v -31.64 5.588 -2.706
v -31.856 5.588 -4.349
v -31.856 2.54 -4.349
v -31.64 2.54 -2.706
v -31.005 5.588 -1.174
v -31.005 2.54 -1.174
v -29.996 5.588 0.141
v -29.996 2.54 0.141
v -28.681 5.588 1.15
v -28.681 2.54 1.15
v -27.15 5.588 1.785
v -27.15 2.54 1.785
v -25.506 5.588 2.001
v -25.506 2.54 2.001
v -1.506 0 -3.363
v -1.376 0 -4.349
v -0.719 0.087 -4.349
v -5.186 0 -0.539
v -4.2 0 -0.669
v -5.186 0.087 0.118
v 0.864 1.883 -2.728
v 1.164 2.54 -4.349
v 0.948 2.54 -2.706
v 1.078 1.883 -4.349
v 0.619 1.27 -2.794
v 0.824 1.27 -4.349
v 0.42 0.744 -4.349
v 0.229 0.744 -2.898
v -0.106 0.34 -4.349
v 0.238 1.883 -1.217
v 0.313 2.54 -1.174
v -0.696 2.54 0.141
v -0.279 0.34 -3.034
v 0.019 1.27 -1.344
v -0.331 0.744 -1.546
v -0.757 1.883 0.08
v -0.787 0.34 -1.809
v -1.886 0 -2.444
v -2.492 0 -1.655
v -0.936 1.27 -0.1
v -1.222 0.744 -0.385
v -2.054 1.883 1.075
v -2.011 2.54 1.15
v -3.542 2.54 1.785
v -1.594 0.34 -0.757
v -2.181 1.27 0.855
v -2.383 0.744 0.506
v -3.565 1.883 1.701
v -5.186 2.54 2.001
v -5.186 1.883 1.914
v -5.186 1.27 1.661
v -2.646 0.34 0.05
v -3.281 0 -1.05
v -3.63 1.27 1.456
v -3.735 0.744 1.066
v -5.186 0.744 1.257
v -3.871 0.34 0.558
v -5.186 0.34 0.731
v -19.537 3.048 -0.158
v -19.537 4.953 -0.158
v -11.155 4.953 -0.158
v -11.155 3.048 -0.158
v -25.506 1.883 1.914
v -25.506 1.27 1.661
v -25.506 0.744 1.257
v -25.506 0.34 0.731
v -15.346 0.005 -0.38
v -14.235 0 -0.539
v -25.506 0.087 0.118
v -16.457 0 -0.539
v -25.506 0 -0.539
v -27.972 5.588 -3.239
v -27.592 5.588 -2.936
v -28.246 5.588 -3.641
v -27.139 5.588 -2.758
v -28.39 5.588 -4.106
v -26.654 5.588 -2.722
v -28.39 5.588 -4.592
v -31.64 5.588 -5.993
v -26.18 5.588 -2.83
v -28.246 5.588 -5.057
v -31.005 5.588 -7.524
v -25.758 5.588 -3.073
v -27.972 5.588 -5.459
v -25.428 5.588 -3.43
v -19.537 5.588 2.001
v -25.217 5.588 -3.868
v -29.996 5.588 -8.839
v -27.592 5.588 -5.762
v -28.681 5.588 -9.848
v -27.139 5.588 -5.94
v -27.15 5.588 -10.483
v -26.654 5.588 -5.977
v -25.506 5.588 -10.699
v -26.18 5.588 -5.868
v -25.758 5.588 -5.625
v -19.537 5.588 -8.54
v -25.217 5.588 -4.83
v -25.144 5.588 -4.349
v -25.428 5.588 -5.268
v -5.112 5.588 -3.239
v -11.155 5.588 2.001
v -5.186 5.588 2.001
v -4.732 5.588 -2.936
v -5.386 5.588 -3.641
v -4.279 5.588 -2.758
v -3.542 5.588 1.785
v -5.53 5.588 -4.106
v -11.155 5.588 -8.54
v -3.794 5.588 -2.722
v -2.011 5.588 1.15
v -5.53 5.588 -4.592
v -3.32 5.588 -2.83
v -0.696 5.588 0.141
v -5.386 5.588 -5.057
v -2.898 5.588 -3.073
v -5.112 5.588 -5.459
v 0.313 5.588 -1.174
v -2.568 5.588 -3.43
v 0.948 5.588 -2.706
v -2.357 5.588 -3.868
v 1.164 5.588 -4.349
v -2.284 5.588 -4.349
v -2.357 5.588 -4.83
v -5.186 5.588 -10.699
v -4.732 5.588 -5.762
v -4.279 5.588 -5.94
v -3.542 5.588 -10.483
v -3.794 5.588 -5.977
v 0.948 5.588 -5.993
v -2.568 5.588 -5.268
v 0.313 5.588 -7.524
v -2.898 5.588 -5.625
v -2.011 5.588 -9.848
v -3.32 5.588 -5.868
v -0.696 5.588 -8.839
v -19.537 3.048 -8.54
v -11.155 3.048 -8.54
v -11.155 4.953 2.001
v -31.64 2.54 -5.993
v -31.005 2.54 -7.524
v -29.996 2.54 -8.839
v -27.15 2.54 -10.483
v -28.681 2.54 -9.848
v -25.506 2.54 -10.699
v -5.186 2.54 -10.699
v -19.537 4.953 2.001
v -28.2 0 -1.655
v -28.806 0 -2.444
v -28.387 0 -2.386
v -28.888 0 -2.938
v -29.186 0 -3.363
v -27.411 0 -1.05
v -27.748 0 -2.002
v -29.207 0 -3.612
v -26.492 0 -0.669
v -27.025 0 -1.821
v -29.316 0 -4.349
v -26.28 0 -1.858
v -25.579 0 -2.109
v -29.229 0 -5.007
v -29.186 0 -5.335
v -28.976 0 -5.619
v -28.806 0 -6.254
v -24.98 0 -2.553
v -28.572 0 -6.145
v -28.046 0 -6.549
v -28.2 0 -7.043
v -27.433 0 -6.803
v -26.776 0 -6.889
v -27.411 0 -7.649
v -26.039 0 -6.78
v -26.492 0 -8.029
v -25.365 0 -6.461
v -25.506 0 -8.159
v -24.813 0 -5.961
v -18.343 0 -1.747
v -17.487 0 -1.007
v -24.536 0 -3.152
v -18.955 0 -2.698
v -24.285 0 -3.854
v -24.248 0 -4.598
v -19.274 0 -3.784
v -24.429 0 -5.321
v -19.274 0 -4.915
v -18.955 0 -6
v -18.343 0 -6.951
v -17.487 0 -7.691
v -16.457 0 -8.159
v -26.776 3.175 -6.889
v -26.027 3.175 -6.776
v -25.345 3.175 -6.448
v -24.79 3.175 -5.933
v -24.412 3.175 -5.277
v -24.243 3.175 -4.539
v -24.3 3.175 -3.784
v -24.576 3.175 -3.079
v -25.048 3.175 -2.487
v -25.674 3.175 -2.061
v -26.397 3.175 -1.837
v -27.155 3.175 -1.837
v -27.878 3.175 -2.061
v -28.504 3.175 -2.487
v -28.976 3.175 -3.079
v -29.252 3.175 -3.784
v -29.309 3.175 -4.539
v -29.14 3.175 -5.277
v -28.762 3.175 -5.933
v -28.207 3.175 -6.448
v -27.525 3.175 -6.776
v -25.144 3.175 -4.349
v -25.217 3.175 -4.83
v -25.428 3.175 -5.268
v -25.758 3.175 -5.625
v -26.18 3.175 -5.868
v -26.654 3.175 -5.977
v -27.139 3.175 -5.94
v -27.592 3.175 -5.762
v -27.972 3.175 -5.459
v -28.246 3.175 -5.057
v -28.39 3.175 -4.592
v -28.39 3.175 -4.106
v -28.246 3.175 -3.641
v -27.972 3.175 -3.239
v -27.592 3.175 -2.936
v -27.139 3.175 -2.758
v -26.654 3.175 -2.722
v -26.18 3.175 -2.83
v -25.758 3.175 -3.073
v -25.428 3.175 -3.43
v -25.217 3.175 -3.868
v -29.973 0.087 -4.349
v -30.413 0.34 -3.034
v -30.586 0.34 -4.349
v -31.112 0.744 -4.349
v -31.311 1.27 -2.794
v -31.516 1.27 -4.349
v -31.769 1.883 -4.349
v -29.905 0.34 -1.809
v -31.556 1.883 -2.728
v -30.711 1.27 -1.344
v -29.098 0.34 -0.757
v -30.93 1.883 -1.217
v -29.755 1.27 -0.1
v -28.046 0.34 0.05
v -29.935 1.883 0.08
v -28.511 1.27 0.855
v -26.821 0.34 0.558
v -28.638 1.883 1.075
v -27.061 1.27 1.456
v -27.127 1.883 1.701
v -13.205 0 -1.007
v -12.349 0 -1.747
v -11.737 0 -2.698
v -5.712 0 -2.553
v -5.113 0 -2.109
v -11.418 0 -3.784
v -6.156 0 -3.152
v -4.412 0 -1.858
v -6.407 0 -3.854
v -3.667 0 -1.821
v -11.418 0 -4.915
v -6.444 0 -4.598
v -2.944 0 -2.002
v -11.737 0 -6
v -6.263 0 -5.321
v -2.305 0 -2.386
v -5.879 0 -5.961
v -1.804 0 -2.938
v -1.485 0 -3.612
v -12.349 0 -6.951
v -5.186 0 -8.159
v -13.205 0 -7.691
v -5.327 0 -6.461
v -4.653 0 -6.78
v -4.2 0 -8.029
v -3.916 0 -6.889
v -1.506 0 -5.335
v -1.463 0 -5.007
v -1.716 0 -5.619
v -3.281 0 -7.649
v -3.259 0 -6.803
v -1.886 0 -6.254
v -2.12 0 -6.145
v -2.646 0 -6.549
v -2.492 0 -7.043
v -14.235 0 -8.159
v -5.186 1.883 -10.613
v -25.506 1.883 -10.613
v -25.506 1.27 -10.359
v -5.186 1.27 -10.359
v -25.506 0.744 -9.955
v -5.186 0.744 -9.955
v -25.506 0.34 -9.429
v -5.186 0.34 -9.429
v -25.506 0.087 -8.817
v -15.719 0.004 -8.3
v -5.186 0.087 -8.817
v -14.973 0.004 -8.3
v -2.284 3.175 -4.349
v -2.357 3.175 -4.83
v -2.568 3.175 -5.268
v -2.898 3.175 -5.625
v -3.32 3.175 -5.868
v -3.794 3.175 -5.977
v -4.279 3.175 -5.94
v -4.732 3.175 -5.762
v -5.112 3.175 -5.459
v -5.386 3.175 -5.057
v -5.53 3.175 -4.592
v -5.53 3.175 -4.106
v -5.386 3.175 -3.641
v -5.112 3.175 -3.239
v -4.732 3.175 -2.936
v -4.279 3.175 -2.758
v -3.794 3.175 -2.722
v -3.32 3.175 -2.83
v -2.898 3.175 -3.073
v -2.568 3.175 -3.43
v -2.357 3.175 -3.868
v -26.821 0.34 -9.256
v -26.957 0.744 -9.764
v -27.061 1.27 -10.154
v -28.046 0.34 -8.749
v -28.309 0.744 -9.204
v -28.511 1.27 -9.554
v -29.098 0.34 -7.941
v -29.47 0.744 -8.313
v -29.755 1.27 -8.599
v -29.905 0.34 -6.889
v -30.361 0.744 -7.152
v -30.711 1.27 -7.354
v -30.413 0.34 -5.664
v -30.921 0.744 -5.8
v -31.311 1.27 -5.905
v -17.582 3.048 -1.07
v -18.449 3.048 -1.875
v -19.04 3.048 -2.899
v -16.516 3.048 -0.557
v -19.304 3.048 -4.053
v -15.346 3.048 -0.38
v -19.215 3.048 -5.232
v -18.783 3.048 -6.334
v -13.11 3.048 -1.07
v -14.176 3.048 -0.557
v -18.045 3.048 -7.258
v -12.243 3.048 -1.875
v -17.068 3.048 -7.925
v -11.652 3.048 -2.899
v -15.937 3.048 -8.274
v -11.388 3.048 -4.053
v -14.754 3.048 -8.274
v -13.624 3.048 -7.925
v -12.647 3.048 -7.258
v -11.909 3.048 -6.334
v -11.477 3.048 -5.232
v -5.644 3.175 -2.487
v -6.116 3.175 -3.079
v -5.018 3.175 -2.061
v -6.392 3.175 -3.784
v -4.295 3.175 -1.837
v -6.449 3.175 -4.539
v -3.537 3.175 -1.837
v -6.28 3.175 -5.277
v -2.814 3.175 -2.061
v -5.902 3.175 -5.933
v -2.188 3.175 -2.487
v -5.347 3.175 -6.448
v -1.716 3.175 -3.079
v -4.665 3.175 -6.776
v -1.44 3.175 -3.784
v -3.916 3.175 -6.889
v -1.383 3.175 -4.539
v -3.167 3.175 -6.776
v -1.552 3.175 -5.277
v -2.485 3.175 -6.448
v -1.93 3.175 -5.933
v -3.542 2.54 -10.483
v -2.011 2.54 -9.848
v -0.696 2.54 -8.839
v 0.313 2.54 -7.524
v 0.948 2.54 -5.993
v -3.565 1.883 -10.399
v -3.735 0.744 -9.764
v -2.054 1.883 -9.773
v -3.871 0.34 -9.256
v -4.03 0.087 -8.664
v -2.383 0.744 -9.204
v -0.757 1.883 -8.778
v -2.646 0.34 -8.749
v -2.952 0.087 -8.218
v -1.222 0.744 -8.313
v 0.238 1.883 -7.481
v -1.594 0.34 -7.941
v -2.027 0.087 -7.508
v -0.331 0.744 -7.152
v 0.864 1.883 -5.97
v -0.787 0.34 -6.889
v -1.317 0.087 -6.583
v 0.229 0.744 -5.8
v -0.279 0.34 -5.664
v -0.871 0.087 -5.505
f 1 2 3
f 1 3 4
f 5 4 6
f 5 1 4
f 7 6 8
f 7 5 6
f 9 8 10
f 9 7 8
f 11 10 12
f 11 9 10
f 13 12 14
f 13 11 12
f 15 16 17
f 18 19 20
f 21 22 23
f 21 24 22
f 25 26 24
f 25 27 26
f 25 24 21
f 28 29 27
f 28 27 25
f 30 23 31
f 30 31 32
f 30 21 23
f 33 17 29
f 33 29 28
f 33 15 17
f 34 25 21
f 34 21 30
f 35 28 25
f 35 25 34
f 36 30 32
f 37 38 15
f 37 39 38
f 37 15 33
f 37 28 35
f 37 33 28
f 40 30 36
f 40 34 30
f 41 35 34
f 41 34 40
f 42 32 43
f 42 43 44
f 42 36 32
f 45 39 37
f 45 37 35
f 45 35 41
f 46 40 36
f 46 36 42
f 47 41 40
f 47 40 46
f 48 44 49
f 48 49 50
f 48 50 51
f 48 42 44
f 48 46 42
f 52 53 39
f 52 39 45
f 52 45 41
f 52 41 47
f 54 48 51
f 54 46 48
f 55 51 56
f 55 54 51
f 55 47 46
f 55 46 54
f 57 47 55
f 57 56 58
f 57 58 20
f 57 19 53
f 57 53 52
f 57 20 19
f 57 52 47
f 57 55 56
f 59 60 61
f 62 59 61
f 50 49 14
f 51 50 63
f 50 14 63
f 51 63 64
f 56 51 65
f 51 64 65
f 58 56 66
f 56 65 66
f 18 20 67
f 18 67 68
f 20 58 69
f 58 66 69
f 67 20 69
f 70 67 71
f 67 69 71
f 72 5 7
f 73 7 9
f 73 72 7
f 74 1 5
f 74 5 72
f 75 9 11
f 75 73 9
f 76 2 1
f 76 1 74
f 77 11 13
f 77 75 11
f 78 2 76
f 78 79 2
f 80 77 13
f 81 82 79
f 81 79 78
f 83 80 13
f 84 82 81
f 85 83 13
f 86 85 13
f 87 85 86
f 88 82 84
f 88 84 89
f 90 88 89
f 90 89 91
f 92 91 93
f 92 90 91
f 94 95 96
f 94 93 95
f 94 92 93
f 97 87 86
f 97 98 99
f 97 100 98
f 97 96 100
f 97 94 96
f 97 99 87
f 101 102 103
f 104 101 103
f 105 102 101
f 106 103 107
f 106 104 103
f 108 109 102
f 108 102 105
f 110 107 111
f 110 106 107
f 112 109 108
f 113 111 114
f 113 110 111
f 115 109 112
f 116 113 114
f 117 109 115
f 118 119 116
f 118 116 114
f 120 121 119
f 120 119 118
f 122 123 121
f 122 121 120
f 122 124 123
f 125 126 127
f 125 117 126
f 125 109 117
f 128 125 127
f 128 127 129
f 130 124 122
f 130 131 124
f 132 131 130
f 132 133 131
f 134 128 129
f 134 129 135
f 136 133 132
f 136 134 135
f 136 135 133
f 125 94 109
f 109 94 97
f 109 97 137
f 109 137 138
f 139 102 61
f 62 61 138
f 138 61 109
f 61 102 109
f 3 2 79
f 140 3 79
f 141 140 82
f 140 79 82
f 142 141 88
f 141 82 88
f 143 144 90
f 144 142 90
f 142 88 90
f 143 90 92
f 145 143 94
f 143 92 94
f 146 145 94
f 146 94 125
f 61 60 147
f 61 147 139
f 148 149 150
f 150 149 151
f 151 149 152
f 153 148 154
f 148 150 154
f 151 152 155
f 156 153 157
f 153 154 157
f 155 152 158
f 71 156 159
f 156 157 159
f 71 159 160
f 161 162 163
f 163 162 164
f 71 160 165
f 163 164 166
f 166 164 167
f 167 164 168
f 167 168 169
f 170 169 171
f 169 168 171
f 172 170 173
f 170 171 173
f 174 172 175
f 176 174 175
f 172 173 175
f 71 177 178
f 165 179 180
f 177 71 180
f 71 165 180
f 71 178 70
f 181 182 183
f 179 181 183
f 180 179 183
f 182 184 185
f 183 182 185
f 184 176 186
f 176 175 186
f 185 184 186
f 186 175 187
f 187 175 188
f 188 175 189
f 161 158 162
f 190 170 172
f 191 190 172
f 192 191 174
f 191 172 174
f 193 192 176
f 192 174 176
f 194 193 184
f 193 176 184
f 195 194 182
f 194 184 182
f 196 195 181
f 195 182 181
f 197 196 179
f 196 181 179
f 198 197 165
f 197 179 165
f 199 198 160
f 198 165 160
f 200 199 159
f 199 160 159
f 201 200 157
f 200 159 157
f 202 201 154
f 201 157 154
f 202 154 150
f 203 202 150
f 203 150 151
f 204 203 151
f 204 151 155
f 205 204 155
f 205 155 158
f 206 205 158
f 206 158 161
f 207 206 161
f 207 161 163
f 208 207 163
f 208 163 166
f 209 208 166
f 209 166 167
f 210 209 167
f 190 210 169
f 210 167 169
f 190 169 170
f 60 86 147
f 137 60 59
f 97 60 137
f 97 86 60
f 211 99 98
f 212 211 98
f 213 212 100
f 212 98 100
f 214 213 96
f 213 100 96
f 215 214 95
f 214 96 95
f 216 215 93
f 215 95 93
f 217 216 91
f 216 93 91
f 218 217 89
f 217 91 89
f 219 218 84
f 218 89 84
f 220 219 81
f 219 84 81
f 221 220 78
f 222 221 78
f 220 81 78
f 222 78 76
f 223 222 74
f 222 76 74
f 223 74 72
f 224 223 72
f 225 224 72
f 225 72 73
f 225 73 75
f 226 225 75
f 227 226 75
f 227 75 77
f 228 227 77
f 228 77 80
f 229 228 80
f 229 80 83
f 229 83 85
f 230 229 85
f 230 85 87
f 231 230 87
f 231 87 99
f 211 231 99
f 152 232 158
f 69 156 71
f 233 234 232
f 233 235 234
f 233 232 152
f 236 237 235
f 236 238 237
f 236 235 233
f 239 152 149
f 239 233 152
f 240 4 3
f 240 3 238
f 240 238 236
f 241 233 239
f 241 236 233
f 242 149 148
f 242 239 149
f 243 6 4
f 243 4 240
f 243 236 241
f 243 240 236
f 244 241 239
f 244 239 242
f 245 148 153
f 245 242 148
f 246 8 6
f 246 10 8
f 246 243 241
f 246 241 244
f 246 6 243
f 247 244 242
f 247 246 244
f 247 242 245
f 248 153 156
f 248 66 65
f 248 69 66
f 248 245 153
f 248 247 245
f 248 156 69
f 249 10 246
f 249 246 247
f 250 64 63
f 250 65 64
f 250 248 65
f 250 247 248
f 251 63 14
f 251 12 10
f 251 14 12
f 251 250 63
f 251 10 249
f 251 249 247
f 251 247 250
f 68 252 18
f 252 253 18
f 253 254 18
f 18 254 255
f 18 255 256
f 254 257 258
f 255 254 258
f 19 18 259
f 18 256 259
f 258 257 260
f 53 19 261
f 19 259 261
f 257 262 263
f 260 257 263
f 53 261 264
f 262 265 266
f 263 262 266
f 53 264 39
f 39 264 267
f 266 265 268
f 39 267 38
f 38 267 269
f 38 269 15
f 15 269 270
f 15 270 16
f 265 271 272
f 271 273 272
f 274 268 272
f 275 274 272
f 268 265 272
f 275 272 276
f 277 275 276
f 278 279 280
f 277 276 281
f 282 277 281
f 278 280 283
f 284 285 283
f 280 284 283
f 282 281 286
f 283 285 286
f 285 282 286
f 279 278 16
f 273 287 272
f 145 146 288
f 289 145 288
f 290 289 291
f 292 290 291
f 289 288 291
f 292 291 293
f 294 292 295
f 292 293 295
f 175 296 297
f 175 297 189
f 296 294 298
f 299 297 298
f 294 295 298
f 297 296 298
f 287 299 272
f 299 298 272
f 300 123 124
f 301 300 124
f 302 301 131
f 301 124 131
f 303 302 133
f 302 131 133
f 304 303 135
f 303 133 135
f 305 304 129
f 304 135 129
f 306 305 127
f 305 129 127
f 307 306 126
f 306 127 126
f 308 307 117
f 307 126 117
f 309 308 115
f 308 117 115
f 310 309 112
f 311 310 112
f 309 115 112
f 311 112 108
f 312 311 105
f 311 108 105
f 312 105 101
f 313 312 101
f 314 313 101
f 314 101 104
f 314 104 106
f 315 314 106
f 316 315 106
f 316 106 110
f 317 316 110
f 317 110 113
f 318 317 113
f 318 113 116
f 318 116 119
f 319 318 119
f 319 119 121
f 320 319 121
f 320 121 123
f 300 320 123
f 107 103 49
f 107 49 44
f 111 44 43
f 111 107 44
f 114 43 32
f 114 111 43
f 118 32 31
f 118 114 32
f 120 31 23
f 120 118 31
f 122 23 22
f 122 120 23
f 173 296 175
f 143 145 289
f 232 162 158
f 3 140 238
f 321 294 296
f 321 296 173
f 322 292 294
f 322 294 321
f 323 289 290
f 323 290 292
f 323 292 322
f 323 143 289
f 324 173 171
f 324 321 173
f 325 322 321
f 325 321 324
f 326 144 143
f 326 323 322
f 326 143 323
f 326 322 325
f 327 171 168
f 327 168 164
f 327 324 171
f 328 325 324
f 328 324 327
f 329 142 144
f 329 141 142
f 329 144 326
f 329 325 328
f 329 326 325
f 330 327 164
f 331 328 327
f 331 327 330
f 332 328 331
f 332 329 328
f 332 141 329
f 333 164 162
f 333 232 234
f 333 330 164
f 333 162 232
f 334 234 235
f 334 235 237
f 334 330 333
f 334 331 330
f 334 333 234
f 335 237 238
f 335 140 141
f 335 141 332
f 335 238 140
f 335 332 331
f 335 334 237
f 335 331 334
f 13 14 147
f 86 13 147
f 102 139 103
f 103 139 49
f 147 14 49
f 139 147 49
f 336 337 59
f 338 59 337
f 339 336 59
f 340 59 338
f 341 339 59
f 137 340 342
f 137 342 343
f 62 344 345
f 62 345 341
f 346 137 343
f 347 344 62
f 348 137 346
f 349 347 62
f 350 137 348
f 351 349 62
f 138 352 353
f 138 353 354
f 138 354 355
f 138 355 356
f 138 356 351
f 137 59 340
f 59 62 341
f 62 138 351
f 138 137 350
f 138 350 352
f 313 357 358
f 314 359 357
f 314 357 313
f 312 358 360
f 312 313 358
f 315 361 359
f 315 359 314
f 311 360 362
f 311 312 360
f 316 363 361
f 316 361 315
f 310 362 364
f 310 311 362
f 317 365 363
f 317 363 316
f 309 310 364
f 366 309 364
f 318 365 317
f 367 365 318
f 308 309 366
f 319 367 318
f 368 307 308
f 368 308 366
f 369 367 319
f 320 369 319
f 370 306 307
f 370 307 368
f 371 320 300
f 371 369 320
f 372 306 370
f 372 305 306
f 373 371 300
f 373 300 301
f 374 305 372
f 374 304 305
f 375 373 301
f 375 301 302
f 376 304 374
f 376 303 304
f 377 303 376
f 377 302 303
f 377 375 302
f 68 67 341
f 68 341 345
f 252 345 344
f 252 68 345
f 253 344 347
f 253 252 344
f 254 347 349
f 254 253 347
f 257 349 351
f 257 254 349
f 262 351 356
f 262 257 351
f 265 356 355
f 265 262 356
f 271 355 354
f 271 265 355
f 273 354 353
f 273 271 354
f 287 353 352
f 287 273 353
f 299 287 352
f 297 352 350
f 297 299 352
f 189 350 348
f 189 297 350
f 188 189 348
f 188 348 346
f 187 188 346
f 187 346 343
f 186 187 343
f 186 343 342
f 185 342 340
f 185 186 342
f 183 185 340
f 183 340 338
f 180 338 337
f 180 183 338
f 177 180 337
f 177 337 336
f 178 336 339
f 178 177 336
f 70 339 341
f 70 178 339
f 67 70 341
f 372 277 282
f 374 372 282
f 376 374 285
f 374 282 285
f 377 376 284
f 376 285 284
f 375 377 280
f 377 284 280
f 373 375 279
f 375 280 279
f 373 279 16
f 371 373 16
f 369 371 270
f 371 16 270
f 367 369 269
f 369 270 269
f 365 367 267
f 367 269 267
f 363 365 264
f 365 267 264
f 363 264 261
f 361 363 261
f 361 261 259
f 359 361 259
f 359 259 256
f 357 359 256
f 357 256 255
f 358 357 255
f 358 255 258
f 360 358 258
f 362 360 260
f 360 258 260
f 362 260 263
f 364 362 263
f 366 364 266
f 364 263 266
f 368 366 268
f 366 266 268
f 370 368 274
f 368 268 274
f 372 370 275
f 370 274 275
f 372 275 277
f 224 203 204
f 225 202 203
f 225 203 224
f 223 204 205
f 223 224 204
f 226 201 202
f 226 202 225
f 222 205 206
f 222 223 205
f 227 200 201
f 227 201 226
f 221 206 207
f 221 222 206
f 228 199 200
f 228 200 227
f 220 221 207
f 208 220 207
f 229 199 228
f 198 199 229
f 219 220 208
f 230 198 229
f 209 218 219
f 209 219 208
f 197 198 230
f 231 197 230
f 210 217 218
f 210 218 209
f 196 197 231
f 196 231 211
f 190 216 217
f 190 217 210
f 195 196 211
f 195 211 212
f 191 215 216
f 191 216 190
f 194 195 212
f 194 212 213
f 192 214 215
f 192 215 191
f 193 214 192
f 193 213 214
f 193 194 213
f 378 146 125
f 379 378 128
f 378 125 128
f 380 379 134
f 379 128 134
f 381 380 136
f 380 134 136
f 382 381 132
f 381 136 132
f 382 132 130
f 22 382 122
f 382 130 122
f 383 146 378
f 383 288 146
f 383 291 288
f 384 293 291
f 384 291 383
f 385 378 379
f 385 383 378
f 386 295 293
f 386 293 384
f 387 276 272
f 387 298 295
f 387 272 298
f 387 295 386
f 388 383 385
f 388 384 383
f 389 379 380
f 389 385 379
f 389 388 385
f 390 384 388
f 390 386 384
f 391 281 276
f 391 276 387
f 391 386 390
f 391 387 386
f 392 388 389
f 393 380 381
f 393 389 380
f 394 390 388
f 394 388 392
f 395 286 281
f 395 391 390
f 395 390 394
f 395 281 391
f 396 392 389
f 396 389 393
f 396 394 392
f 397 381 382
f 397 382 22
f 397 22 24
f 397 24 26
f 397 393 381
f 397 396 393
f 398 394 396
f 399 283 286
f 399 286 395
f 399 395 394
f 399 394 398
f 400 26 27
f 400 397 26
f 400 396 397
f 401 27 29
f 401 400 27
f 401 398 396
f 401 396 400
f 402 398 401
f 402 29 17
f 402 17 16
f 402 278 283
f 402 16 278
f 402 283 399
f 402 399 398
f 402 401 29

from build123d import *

# Parameters (mm, degrees)
SKETCH1_W                 = 33.02
SKETCH1_H                 = 12.7
SKETCH1_R                 = 3.96875
BOSS_EXTRUDE1_DEPTH       = 5.588
SKETCH2_W                 = 8.382
SKETCH2_H                 = 8.382
CUT_EXTRUDE1_DEPTH        = 2.54
F_4_CLEARANCE_HOLE1_D     = 3.2639
F_4_CLEARANCE_HOLE1_DEPTH = 12.7
F_4_CLEARANCE_HOLE1_TIP   = 0.980574487
FILLET1_R                 = 6.35
SKETCH7_W                 = 8.382
SKETCH7_H                 = 2.159
CUT_EXTRUDE2_DEPTH        = 0.635
SKETCH9_R                 = 2.54
CUT_EXTRUDE3_DEPTH        = 3.175
FILLET3_R                 = 2.54


# Some blends are built 0.0001 mm under size
with BuildPart() as part:
    # Sketch1 → Boss-Extrude1 (new body)
    with BuildSketch(Plane(origin=(0, 0, 0), x_dir=(1, 0, 0), z_dir=(0, 1, 0))):
        with Locations((-15.345948133, 4.349128799)):
            Rectangle(SKETCH1_W, SKETCH1_H)
        with Locations(Location((-15.345948133, 4.349128799, 0), (0, 0, 270))):
            Circle(SKETCH1_R, mode=Mode.SUBTRACT)
    extrude(amount=BOSS_EXTRUDE1_DEPTH)

    # Sketch2 → Cut-Extrude1 (cut)
    with BuildSketch(Plane(origin=(0, 5.588, 0), x_dir=(1, 0, 0), z_dir=(0, 1, 0))):
        with Locations((-15.345948133, 4.349128799)):
            Rectangle(SKETCH2_W, SKETCH2_H)
    extrude(amount=-CUT_EXTRUDE1_DEPTH, mode=Mode.SUBTRACT)

    # #4 Clearance Hole1
    with Locations(Plane(origin=(0, 0, 0), x_dir=(-1, 0, 0), z_dir=(0, -1, 0))):
        with Locations((3.915948133, 4.349128799), (26.775948133, 4.349128799)):
            Hole(F_4_CLEARANCE_HOLE1_D / 2, depth=F_4_CLEARANCE_HOLE1_DEPTH)
            with Locations((0, 0, -(F_4_CLEARANCE_HOLE1_DEPTH + F_4_CLEARANCE_HOLE1_TIP / 2))):  # 118° drill point
                Cone(0, F_4_CLEARANCE_HOLE1_D / 2, F_4_CLEARANCE_HOLE1_TIP, mode=Mode.SUBTRACT)

    # Fillet1
    fillet1_edges = [part.edges().sort_by_distance(p)[0] for p in [
        (-31.855948133, 2.794, 2.000871201),
        (-31.855948133, 2.794, -10.699128799),
        (1.164051867, 2.794, -10.699128799),
        (1.164051867, 2.794, 2.000871201),
    ]]
    fillet(fillet1_edges, radius=FILLET1_R - 0.0001)  # a hair under: the kernel refuses the full size

    # Sketch7 → Cut-Extrude2 (cut)
    with BuildSketch(Plane(origin=(0, 5.588, 0), x_dir=(1, 0, 0), z_dir=(0, 1, 0))):
        with Locations((-15.345948133, -0.921371201)):
            Rectangle(SKETCH7_W, SKETCH7_H)
    extrude(amount=-CUT_EXTRUDE2_DEPTH, mode=Mode.SUBTRACT)

    # Sketch9 → Cut-Extrude3 (cut)
    with BuildSketch(Plane.XZ):
        with Locations(Location((-3.915948133, -4.349128799, 0), (0, 0, 270))):
            Circle(SKETCH9_R)
        with Locations(Location((-26.775948133, -4.349128799, 0), (0, 0, 270))):
            Circle(SKETCH9_R)
    extrude(amount=-CUT_EXTRUDE3_DEPTH, mode=Mode.SUBTRACT)

    # Fillet3
    # the kernel refuses this fillet: 2.54 mm, written as the material it takes off along each edge
    with BuildSketch(Plane(origin=(-25.506048133, 0, 2.000871201), x_dir=(0, 0, -1), z_dir=(1, 0, 0))) as fillet3_piece_1:
        with BuildLine():
            CenterArc((FILLET3_R, FILLET3_R), FILLET3_R, 180, 90)
            Line((0, FILLET3_R), (0, 0))
            Line((0, 0), (FILLET3_R, 0))
        make_face()
    extrude(amount=20.3202, mode=Mode.SUBTRACT)
    with BuildSketch(Plane(origin=(-5.185848133, 0, -10.699128799), x_dir=(0, 1, 0), z_dir=(-1, 0, 0))) as fillet3_piece_2:
        with BuildLine():
            CenterArc((FILLET3_R, -FILLET3_R), FILLET3_R, 90, 90)
            Line((0, -FILLET3_R), (0, 0))
            Line((0, 0), (FILLET3_R, 0))
        make_face()
    extrude(amount=20.3202, mode=Mode.SUBTRACT)
    with BuildSketch(Plane(origin=(-5.185848133, 0, -4.349028799), x_dir=(1, 0, 0), z_dir=(0, 0, -1))) as fillet3_piece_3:
        with BuildLine():
            CenterArc((6.3499 - FILLET3_R, -FILLET3_R), FILLET3_R, 0, 90)
            Line((6.3499, -FILLET3_R), (6.3499, 0))
            Line((6.3499, 0), (6.3499 - FILLET3_R, 0))
        make_face()
    revolve(axis=Axis((-5.185848133, 0, -4.349028799), (0, -1, 0)), revolution_arc=90, mode=Mode.SUBTRACT)
    with BuildSketch(Plane(origin=(-5.185848133, 0, -4.349228799), x_dir=(0, 0, -1), z_dir=(-1, 0, 0))) as fillet3_piece_4:
        with BuildLine():
            CenterArc((6.3499 - FILLET3_R, -FILLET3_R), FILLET3_R, 0, 90)
            Line((6.3499, -FILLET3_R), (6.3499, 0))
            Line((6.3499, 0), (6.3499 - FILLET3_R, 0))
        make_face()
    revolve(axis=Axis((-5.185848133, 0, -4.349228799), (0, -1, 0)), revolution_arc=90, mode=Mode.SUBTRACT)
    with BuildSketch(Plane(origin=(-25.506048133, 0, -4.349228799), x_dir=(0, 0, -1), z_dir=(1, 0, 0))) as fillet3_piece_5:
        with BuildLine():
            CenterArc((6.3499 - FILLET3_R, FILLET3_R), FILLET3_R, 270, 90)
            Line((6.3499, FILLET3_R), (6.3499, 0))
            Line((6.3499, 0), (6.3499 - FILLET3_R, 0))
        make_face()
    revolve(axis=Axis((-25.506048133, 0, -4.349228799), (0, 1, 0)), revolution_arc=90, mode=Mode.SUBTRACT)
    with BuildSketch(Plane(origin=(-25.506048133, 0, -4.349028799), x_dir=(-1, 0, 0), z_dir=(0, 0, -1))) as fillet3_piece_6:
        with BuildLine():
            CenterArc((6.3499 - FILLET3_R, FILLET3_R), FILLET3_R, 270, 90)
            Line((6.3499, FILLET3_R), (6.3499, 0))
            Line((6.3499, 0), (6.3499 - FILLET3_R, 0))
        make_face()
    revolve(axis=Axis((-25.506048133, 0, -4.349028799), (0, 1, 0)), revolution_arc=90, mode=Mode.SUBTRACT)
    with BuildSketch(Plane(origin=(-31.855948133, 0, -4.349228799), x_dir=(1, 0, 0), z_dir=(0, 0, 1)), Plane(origin=(1.164051867, 0, -4.349028799), x_dir=(-1, 0, 0), z_dir=(0, 0, -1))) as fillet3_piece_7:
        with BuildLine():
            CenterArc((FILLET3_R, FILLET3_R), FILLET3_R, 180, 90)
            Line((0, FILLET3_R), (0, 0))
            Line((0, 0), (FILLET3_R, 0))
        make_face()
    extrude(amount=0.0002, mode=Mode.SUBTRACT)


solid = part.part
